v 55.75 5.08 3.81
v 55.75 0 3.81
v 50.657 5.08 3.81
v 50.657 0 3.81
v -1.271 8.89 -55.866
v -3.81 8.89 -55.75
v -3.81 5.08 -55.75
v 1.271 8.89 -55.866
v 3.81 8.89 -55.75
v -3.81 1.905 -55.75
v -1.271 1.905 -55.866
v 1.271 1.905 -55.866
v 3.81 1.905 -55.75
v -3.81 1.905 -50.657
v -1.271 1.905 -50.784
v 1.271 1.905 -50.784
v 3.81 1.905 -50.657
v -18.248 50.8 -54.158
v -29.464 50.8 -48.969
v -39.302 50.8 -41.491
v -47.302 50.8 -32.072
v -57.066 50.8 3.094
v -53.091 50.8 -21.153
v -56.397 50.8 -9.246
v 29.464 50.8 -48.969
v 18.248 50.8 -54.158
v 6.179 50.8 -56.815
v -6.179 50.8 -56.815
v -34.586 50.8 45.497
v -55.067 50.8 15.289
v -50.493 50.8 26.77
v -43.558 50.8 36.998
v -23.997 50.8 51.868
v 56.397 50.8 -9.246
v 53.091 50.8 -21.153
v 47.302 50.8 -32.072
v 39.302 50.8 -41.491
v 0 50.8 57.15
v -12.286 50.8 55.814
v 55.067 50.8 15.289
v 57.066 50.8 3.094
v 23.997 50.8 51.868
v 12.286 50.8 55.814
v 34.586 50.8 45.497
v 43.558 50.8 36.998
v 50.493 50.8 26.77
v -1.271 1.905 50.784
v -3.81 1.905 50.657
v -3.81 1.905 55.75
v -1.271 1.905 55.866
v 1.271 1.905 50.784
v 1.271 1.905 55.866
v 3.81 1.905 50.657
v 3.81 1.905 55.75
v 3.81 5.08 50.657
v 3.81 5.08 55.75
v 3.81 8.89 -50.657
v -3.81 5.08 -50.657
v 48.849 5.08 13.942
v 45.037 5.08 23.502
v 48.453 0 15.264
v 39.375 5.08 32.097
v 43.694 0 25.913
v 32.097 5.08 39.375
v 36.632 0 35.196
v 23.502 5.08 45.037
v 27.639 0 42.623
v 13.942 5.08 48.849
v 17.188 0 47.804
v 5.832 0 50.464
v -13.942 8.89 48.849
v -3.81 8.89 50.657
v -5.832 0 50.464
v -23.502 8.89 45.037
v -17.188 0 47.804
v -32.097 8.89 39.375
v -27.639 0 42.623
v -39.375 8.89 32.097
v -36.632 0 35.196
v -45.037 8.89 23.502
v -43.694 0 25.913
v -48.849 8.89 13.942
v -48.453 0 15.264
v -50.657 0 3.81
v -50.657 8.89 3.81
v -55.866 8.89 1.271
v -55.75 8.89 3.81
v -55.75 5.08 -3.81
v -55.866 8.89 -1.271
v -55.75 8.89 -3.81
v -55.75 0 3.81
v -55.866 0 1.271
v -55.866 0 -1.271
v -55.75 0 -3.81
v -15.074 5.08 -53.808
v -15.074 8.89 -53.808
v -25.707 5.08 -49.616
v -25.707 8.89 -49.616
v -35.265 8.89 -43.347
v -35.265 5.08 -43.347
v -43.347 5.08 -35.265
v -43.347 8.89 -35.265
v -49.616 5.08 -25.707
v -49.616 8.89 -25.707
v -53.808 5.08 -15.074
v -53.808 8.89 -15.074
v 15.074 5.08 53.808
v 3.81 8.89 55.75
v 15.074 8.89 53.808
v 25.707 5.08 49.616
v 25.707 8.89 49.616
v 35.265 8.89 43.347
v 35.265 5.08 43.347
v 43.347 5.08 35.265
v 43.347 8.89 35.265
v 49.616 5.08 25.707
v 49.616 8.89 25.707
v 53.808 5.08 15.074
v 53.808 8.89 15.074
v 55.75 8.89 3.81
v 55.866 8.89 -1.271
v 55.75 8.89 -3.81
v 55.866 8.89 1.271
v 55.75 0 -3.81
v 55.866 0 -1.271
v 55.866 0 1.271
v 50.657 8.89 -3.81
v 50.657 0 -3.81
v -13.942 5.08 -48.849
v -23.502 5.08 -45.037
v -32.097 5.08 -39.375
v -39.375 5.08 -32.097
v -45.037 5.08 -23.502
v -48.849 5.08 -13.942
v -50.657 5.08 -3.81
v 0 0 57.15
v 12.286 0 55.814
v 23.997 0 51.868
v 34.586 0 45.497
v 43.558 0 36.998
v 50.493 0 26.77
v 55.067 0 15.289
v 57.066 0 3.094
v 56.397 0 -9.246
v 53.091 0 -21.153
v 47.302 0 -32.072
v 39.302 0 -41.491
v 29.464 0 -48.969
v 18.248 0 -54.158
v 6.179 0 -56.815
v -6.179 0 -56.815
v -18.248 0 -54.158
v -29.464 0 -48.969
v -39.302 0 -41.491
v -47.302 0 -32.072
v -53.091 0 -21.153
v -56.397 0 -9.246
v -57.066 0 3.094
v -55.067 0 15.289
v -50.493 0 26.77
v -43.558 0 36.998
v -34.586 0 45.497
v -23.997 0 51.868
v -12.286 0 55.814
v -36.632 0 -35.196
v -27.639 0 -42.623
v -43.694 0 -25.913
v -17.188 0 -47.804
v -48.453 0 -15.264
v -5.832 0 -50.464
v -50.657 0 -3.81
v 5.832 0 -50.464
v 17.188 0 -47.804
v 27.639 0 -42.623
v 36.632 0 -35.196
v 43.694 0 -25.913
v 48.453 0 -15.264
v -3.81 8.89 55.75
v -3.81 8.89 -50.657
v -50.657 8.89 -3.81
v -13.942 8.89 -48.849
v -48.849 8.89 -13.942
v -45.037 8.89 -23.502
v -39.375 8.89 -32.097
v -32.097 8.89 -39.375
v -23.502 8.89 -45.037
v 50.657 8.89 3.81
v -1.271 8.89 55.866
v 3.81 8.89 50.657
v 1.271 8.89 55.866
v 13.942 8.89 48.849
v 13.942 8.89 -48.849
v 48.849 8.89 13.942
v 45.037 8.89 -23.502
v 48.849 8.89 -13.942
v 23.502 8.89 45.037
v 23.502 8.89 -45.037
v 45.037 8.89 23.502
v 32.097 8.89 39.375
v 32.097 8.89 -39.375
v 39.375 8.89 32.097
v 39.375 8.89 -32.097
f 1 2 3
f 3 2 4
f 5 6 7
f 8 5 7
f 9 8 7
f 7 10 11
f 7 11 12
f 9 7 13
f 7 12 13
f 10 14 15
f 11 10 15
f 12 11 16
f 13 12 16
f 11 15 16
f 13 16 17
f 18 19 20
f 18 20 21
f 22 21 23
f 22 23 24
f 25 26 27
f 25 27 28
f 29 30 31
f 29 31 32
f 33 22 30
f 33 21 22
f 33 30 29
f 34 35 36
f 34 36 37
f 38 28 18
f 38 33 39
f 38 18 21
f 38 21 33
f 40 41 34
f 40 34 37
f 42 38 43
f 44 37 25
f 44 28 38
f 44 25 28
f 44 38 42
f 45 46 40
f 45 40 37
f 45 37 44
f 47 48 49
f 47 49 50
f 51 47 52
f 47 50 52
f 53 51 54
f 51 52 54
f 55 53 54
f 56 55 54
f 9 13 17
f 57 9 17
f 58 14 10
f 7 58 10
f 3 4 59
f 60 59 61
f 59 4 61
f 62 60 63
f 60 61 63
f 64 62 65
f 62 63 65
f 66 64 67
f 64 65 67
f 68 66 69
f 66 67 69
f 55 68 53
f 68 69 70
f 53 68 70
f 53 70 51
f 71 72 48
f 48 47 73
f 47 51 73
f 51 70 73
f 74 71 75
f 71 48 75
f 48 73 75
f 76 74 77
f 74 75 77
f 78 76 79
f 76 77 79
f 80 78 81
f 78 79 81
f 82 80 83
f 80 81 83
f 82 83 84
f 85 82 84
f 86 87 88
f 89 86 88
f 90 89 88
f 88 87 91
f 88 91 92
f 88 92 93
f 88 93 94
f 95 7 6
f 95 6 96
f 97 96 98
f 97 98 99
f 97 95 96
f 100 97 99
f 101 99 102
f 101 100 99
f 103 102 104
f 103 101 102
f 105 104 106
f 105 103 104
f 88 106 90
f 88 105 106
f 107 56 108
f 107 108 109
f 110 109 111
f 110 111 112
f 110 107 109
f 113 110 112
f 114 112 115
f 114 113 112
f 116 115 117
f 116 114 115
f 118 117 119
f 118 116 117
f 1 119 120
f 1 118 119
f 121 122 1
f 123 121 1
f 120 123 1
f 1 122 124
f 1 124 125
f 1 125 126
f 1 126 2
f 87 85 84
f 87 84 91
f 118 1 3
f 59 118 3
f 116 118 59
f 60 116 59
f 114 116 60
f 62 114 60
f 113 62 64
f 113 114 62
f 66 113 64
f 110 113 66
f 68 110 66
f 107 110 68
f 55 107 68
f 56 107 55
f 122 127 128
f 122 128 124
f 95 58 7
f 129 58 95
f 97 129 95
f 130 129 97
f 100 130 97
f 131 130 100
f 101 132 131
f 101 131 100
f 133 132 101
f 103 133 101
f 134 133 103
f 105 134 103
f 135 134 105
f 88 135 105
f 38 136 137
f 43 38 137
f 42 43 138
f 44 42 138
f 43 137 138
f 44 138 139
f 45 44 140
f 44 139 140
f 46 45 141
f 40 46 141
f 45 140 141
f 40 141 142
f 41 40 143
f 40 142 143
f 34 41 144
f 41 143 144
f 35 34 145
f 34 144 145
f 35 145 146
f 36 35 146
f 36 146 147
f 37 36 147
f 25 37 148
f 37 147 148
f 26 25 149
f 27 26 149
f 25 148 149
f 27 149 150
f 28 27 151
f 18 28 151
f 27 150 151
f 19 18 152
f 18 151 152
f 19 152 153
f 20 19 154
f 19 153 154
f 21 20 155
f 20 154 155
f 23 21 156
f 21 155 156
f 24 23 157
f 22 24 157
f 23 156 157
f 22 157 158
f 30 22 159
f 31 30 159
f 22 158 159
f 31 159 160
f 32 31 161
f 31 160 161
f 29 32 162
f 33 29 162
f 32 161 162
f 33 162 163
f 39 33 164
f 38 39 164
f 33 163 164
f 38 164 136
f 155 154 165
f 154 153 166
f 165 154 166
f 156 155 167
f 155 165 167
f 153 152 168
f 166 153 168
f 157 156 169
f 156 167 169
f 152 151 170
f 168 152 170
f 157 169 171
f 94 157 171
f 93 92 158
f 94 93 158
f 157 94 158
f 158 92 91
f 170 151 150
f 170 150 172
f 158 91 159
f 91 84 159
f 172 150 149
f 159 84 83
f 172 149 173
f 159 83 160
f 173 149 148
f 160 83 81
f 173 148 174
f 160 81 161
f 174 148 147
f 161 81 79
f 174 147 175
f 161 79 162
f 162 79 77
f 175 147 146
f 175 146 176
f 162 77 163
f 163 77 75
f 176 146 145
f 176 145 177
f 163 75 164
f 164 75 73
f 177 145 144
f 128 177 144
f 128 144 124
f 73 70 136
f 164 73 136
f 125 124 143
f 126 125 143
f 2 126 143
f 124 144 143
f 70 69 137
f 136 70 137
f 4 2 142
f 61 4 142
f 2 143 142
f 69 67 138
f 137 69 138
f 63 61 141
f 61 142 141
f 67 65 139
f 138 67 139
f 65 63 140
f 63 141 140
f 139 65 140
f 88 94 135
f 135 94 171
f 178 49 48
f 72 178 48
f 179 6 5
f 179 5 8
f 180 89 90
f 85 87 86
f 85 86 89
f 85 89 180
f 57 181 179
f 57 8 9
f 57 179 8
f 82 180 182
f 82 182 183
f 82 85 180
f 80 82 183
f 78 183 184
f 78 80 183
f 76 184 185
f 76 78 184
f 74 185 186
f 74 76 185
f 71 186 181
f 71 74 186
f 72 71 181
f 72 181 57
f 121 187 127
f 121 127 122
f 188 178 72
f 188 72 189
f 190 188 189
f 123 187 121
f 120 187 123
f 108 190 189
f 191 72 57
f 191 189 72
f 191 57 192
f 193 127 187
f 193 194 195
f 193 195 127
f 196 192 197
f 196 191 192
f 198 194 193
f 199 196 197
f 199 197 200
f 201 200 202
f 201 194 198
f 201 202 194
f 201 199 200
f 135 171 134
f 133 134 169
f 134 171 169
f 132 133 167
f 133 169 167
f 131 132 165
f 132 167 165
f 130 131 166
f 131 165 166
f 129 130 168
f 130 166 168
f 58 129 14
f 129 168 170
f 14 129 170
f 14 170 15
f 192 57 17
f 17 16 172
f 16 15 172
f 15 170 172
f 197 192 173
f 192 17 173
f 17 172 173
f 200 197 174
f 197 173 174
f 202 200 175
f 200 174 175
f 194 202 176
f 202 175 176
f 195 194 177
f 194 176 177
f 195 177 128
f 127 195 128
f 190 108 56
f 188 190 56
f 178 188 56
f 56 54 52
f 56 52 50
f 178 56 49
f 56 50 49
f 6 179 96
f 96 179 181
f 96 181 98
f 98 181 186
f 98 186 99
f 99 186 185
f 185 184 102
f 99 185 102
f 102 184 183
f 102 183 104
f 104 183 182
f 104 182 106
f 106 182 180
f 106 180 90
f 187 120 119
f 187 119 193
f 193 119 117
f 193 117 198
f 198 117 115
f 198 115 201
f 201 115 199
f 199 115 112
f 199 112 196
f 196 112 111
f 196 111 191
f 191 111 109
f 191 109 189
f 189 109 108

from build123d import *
from build123d.topology import SkipClean

# Parameters (mm, degrees)
SKETCH1_R           = 57.15
BOSS_EXTRUDE1_DEPTH = 50.8
CUT_EXTRUDE1_DEPTH  = 8.89
CUT_EXTRUDE3_START  = 6.985
CUT_EXTRUDE3_DEPTH  = 6.985
CUT_EXTRUDE5_START  = 3.81
CUT_EXTRUDE5_DEPTH  = 3.81


with BuildPart() as part:
    # Sketch1 → Boss-Extrude1 (new body)
    with BuildSketch(Plane(origin=(0, 0, 0), x_dir=(1, 0, 0), z_dir=(0, 1, 0))):
        with Locations(Location((0, 0, 0), (0, 0, 270))):
            Circle(SKETCH1_R)
    extrude(amount=BOSS_EXTRUDE1_DEPTH)

    # Sketch2 → Cut-Extrude1 (cut)
    with BuildSketch(Plane.XZ):
        with BuildLine():
            Line((55.749962332, 3.81), (50.656923515, 3.81))
            ThreePointArc((50.656923515, 3.81), (0, 50.8), (-50.656923515, 3.81))
            Line((-50.656923515, 3.81), (-55.749962332, 3.81))
            ThreePointArc((-55.749962332, 3.81), (-55.88, 0), (-55.749962332, -3.81))
            Line((-55.749962332, -3.81), (-50.656923515, -3.81))
            ThreePointArc((-50.656923515, -3.81), (0, -50.8), (50.656923515, -3.81))
            Line((50.656923515, -3.81), (55.749962332, -3.81))
            ThreePointArc((55.749962332, -3.81), (55.88, 0), (55.749962332, 3.81))
        make_face()
    extrude(amount=-CUT_EXTRUDE1_DEPTH, mode=Mode.SUBTRACT)

    # Sketch3 → Cut-Extrude3 (cut)
    with BuildSketch(Plane.XZ.offset(-8.89).offset(CUT_EXTRUDE3_START)):
        with BuildLine():
            Line((3.81, -55.749962332), (3.81, -50.656923515))
            ThreePointArc((3.81, -50.656923515), (0, -50.8), (-3.81, -50.656923515))
            Line((-3.81, -50.656923515), (-3.81, -55.749962332))
            ThreePointArc((-3.81, -55.749962332), (0, -55.88), (3.81, -55.749962332))
        make_face()
        with BuildLine():
            Line((-3.81, 55.749962332), (-3.81, 50.656923515))
            ThreePointArc((-3.81, 50.656923515), (0, 50.8), (3.81, 50.656923515))
            Line((3.81, 50.656923515), (3.81, 55.749962332))
            ThreePointArc((3.81, 55.749962332), (0, 55.88), (-3.81, 55.749962332))
        make_face()
    extrude(amount=-CUT_EXTRUDE3_DEPTH, mode=Mode.SUBTRACT)

    # Sketch4 → Cut-Extrude5 (cut)
    with SkipClean():  # the faces are left unmerged after this step: merging them gives an invalid solid
        with BuildSketch(Plane.XZ.offset(-8.89).offset(CUT_EXTRUDE5_START)):
            with BuildLine():
                Line((55.749962332, 3.81), (50.656923515, 3.81))
                ThreePointArc((50.656923515, 3.81), (35.921024484, 35.921024484), (3.81, 50.656923515))
                Line((3.81, 50.656923515), (3.81, 55.749962332))
                ThreePointArc((3.81, 55.749962332), (39.513126933, 39.513126933), (55.749962332, 3.81))
            make_face()
            with BuildLine():
                Line((-55.749962332, -3.81), (-50.656923515, -3.81))
                ThreePointArc((-50.656923515, -3.81), (-35.921024484, -35.921024484), (-3.81, -50.656923515))
                Line((-3.81, -50.656923515), (-3.81, -55.749962332))
                ThreePointArc((-3.81, -55.749962332), (-39.513126933, -39.513126933), (-55.749962332, -3.81))
            make_face()
        extrude(amount=-CUT_EXTRUDE5_DEPTH, mode=Mode.SUBTRACT)


solid = part.part
